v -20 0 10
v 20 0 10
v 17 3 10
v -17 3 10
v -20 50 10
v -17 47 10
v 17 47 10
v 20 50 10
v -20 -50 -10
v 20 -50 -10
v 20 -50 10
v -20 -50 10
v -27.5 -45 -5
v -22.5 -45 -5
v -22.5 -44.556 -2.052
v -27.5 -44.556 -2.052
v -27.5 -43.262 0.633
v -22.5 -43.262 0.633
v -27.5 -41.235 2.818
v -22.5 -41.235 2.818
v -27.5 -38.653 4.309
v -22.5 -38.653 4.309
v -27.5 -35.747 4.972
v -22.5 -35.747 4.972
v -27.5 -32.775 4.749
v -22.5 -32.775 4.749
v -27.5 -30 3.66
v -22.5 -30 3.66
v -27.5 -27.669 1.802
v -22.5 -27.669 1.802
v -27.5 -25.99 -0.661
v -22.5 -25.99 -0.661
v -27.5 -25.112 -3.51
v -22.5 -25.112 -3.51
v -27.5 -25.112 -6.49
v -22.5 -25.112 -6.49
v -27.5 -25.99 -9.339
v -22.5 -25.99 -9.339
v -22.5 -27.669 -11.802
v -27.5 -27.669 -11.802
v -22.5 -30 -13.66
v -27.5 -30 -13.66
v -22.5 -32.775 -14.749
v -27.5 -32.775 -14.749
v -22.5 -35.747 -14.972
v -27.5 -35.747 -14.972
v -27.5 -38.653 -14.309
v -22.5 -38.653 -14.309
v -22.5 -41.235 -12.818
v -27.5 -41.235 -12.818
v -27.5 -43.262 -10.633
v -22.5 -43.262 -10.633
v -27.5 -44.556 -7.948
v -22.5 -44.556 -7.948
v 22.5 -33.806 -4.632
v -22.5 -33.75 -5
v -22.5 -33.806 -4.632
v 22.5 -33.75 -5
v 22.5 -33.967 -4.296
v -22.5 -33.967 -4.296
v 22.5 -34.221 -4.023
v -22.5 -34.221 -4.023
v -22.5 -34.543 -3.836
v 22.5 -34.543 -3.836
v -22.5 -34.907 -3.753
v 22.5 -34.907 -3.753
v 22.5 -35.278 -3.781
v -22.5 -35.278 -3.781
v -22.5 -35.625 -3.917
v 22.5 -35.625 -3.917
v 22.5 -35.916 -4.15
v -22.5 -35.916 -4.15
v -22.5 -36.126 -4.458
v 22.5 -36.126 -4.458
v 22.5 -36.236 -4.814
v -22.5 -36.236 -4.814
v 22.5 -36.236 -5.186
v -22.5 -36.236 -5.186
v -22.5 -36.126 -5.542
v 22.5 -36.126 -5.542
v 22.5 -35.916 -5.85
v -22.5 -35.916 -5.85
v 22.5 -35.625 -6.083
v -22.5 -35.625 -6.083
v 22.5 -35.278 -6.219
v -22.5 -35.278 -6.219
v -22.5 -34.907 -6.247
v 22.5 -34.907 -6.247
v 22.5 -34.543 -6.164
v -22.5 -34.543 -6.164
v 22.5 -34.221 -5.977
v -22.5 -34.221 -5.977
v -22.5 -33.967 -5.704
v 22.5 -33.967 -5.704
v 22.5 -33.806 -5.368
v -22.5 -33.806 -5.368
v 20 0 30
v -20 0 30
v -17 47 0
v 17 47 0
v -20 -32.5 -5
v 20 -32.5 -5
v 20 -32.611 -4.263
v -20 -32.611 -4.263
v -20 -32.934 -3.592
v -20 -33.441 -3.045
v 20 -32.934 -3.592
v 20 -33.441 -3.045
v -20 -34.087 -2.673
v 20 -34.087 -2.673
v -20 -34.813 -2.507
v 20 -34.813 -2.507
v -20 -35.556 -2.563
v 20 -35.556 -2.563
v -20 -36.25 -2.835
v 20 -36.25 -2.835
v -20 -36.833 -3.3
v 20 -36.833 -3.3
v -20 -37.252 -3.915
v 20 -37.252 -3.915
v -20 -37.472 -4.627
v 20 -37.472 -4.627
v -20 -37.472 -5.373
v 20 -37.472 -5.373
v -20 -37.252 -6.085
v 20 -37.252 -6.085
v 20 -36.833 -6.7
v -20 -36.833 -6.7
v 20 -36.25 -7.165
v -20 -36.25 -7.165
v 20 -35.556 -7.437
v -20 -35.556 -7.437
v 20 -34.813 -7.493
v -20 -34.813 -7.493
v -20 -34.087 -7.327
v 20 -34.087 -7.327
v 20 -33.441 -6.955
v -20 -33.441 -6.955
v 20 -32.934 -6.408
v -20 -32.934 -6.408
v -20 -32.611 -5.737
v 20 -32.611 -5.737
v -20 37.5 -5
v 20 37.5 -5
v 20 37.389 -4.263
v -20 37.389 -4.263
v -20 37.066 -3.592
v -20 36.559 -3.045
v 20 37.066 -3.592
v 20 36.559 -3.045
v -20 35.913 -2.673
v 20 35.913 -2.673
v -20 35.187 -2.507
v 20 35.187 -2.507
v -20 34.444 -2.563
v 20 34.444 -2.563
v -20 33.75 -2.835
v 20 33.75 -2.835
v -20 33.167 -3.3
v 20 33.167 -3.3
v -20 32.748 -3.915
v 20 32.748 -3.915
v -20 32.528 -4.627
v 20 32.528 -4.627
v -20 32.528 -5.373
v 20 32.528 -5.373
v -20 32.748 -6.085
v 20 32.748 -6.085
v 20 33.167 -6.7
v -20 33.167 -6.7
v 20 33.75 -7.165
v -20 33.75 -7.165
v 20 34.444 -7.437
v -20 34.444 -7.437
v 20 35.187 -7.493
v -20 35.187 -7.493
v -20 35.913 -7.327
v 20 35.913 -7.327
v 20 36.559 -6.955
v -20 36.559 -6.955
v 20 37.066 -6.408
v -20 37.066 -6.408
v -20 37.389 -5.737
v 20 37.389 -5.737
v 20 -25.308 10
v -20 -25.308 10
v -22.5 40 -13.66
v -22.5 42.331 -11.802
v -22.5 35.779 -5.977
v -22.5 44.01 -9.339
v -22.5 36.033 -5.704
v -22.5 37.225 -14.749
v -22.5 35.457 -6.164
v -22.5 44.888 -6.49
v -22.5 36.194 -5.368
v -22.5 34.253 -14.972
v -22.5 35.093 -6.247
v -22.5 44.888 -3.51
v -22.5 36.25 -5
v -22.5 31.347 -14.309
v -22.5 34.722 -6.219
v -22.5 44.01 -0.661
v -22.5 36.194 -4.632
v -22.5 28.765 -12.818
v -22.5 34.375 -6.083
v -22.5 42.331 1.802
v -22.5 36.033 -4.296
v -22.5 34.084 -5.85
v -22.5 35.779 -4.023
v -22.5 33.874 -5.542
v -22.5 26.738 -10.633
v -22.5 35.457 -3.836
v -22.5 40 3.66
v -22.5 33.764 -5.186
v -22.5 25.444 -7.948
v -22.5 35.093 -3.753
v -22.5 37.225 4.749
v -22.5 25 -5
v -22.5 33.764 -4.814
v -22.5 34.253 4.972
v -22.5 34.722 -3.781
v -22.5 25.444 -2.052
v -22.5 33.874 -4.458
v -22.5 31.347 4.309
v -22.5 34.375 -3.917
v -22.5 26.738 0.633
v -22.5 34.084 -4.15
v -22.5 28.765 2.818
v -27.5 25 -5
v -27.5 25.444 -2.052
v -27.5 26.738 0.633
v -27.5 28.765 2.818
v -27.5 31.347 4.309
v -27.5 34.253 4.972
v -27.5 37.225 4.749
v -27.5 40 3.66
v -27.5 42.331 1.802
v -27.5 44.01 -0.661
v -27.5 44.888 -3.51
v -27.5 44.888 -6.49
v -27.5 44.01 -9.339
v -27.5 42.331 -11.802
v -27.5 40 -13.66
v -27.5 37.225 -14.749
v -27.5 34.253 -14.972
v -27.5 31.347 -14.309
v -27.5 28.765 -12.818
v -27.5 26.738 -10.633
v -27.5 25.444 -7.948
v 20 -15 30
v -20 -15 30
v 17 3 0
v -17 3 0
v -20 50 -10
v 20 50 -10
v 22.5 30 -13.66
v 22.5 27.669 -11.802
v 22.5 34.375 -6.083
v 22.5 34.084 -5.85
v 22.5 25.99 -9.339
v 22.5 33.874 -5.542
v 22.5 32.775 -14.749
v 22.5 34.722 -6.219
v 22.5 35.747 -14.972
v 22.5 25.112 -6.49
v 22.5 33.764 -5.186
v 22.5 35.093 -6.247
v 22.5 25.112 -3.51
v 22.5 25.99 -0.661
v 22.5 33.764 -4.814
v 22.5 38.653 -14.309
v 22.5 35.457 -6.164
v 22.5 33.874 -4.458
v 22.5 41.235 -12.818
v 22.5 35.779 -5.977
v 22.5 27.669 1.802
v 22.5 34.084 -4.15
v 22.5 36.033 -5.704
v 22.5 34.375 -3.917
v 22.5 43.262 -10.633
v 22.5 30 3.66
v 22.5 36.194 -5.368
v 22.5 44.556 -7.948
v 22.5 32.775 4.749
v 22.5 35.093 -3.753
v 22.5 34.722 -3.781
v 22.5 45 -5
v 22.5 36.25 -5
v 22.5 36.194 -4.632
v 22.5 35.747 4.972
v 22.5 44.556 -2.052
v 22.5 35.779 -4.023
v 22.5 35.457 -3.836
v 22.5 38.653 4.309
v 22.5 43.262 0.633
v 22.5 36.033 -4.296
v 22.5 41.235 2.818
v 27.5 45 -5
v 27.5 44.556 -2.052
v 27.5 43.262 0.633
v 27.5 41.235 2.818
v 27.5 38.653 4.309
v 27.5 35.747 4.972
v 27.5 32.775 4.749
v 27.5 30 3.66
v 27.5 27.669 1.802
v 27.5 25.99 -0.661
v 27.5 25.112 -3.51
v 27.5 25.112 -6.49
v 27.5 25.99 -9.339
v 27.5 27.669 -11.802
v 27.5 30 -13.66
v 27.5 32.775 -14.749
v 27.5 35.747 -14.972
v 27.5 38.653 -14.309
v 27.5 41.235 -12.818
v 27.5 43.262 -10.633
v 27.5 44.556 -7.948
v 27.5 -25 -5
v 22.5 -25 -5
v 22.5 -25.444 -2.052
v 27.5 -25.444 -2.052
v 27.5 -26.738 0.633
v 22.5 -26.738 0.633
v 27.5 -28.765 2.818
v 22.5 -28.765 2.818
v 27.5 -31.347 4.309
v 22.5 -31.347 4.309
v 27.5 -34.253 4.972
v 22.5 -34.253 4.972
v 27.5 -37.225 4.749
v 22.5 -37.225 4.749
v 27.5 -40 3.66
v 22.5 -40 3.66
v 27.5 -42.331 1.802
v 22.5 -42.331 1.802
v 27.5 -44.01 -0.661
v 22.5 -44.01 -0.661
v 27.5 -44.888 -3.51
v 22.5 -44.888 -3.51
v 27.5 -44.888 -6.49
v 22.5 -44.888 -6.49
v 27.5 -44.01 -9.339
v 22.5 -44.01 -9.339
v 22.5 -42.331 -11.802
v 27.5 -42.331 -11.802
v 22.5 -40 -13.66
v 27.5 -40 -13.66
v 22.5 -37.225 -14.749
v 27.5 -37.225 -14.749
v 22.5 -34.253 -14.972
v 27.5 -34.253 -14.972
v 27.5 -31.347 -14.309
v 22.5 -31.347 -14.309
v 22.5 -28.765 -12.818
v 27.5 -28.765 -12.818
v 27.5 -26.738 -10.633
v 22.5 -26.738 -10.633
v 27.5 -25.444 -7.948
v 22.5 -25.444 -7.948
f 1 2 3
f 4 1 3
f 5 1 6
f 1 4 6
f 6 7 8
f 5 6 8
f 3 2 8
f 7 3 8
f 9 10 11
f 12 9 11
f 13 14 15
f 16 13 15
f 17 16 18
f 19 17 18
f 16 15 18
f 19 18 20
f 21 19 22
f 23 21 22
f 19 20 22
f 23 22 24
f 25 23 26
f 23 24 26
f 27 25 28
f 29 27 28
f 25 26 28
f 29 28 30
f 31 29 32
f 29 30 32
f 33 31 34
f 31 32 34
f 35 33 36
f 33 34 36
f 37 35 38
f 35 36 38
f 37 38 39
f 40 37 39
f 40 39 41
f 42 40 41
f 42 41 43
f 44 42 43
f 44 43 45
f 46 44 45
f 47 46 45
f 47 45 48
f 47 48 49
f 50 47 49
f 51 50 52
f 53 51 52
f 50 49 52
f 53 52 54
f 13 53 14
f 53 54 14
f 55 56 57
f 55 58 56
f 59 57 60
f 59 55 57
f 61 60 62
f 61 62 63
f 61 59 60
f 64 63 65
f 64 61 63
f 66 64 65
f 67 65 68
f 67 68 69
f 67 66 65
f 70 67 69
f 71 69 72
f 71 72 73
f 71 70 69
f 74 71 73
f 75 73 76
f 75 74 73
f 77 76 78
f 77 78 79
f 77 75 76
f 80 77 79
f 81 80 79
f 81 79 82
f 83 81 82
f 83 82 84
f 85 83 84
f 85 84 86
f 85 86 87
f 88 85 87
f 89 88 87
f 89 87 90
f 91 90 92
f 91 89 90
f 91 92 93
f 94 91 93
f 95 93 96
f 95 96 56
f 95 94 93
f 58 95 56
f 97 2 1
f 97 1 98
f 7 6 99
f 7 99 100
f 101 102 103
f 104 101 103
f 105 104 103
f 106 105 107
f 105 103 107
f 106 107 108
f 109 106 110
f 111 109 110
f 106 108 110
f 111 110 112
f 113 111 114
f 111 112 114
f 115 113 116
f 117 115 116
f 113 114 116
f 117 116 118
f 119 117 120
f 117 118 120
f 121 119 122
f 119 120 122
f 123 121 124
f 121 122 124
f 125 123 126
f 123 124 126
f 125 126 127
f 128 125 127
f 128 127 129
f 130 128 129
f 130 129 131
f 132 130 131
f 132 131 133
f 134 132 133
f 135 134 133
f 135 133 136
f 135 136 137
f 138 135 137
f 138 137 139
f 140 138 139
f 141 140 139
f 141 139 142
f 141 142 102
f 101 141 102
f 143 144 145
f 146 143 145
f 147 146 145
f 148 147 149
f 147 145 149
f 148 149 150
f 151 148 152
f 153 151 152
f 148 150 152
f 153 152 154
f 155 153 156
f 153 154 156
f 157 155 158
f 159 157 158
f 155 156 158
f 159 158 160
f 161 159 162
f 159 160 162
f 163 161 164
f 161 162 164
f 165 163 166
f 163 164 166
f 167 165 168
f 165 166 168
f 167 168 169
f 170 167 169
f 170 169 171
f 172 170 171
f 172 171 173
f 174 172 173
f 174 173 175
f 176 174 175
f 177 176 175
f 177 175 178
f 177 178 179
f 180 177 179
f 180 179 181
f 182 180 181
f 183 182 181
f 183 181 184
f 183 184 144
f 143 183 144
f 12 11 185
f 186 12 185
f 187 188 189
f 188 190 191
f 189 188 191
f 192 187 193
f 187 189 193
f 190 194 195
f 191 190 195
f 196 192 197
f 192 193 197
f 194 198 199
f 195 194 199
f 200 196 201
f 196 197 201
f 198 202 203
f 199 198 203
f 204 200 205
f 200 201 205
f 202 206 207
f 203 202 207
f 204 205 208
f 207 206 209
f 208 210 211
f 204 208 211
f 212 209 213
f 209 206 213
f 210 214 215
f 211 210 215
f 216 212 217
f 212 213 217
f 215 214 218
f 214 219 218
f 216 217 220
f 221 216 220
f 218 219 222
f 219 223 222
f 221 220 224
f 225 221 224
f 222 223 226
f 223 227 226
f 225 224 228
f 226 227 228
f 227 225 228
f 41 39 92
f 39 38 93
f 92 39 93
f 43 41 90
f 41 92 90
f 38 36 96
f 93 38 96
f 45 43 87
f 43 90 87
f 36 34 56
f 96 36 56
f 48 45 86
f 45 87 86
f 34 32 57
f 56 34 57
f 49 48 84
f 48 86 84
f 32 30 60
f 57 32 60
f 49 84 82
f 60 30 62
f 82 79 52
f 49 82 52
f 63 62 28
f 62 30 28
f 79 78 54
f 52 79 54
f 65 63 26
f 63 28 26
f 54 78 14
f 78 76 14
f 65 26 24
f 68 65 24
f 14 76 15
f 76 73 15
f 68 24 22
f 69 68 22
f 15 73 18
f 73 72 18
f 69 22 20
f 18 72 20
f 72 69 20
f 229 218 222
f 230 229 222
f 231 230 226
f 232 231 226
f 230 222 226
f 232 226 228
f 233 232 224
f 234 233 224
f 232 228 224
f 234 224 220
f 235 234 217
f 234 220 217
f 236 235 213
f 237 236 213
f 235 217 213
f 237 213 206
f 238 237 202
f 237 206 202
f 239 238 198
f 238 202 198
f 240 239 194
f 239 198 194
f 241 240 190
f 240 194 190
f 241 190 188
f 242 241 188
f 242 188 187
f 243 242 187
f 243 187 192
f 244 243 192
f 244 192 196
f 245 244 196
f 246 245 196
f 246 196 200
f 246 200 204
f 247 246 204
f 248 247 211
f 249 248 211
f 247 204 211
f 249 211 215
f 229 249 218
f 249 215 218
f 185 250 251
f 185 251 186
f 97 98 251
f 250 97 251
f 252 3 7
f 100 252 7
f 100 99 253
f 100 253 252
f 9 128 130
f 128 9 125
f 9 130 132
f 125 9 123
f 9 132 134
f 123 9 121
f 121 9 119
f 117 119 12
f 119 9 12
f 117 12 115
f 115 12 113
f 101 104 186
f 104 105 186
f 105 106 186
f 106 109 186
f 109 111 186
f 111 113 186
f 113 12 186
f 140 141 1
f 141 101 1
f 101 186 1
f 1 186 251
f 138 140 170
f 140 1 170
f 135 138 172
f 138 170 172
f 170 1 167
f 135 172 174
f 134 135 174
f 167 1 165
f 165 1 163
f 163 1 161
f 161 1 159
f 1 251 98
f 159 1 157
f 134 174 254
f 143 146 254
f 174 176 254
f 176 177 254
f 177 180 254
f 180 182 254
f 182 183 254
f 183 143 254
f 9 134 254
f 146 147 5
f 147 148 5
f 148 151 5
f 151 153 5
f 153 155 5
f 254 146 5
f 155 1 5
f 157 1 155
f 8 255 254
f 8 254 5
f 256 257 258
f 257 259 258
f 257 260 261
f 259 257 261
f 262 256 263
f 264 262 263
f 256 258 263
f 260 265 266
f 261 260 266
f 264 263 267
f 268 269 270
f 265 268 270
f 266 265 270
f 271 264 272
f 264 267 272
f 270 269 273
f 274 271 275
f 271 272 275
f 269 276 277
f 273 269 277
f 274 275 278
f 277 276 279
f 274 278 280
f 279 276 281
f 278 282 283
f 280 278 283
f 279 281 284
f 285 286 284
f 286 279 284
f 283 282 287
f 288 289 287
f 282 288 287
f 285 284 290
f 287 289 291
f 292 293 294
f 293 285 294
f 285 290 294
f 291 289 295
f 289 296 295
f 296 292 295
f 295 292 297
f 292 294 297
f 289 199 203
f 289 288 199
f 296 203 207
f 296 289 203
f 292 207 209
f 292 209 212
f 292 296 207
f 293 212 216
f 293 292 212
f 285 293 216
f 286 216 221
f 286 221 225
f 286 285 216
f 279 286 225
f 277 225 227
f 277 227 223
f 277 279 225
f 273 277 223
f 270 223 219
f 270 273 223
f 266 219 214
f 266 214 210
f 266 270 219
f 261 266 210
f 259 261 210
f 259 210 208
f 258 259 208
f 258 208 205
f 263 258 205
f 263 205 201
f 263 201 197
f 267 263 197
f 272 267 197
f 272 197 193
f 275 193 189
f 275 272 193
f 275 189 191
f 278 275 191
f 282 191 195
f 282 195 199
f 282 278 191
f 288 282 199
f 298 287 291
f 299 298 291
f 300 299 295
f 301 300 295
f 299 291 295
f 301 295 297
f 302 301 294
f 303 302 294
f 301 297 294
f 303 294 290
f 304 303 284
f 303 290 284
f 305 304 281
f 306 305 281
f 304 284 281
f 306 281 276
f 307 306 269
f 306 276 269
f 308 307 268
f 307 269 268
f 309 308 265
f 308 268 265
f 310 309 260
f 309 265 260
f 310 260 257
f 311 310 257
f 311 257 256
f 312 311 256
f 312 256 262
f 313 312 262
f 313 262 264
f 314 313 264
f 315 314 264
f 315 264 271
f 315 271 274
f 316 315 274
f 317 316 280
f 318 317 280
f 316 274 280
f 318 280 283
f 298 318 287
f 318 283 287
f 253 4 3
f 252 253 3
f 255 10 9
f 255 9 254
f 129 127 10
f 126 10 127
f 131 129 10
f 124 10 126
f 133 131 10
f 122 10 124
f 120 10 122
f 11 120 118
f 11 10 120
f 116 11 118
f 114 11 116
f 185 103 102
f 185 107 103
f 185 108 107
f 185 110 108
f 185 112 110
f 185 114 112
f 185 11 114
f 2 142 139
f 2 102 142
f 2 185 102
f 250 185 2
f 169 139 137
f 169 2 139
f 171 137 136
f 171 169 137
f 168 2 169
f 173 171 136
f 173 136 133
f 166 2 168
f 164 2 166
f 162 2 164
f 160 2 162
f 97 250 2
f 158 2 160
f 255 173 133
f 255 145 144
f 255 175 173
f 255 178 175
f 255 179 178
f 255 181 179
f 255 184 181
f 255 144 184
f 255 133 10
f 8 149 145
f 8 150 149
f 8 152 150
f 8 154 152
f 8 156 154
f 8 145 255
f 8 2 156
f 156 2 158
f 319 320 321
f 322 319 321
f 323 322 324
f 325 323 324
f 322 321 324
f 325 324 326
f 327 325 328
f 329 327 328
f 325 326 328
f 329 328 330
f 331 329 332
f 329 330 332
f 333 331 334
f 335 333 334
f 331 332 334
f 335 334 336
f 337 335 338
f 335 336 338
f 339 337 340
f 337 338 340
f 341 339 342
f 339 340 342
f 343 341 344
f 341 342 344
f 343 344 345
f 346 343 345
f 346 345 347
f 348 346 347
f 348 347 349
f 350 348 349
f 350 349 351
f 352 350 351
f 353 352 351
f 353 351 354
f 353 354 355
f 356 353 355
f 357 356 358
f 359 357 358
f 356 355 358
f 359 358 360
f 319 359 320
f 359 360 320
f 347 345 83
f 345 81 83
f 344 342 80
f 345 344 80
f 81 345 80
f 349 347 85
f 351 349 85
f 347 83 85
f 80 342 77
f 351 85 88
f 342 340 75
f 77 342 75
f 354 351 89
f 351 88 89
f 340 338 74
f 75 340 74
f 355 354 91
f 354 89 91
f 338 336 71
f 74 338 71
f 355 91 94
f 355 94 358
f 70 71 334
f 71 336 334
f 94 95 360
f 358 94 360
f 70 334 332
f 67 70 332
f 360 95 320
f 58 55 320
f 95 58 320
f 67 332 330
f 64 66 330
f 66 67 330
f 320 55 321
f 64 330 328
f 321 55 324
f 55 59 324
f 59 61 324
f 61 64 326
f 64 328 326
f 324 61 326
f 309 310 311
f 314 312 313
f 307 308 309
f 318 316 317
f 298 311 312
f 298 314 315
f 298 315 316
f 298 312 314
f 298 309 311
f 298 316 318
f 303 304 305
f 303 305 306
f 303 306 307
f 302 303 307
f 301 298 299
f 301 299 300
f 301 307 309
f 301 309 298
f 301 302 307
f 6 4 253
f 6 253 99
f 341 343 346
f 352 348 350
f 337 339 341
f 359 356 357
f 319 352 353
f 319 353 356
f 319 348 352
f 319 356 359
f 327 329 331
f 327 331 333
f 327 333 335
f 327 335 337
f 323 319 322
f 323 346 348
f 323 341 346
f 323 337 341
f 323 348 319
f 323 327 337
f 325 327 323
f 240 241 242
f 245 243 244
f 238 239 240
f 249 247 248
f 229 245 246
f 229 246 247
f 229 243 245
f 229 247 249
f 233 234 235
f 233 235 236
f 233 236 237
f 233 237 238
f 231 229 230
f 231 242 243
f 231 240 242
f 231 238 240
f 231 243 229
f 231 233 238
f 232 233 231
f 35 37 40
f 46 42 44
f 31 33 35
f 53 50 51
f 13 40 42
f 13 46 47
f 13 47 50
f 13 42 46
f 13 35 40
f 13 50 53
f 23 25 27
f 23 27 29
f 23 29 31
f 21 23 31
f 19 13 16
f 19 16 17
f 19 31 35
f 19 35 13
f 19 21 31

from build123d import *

# Parameters (mm, degrees)
F0_W           = 100
F0_H           = 20
F1_DEPTH       = 20
F3_DEPTH       = 40
F4_R           = 2.5
F5_DEPTH       = 40.001
F6_R           = 2.5
F7_DEPTH       = 40.001
F8_W           = 34
F8_H           = 44
F9_DEPTH       = 10
F10_R          = 1.25
F11_DEPTH      = 2.5
F11_DEPTH_BACK = 42.5
F12_R          = 1.25
F13_DEPTH      = 2.5
F13_DEPTH_BACK = 42.5
F14_R          = 10
F15_DEPTH      = 5
F16_R          = 10
F17_DEPTH      = 5
F18_R          = 10
F19_DEPTH      = 5
F20_R          = 10
F21_DEPTH      = 5


with BuildPart() as f1:
    # F0 (on Right) → F1 (new body, symmetric)
    with BuildSketch(Plane.YZ):
        Rectangle(F0_W, F0_H)
    extrude(amount=F1_DEPTH, both=True)

    # F2 (on face) → F3 (join)
    with BuildSketch(Plane.YZ.offset(20)):
        Polygon((-25.30775, 10), (0, 10), (0, 30), (-15, 30), align=None)
    extrude(amount=-F3_DEPTH)

    # F4 (on face) → F5 (cut, through all)
    with BuildSketch(Plane.YZ.offset(20)):
        with Locations((-35, -5)):
            Circle(F4_R)
    extrude(amount=-F5_DEPTH, mode=Mode.SUBTRACT)

    # F6 (on face) → F7 (cut, through all)
    with BuildSketch(Plane.YZ.offset(20)):
        with Locations((35, -5)):
            Circle(F6_R)
    extrude(amount=-F7_DEPTH, mode=Mode.SUBTRACT)

    # F8 (on face) → F9 (cut)
    with BuildSketch(Plane.XY.offset(10)):
        with Locations((0, 25)):
            Rectangle(F8_W, F8_H)
    extrude(amount=-F9_DEPTH, mode=Mode.SUBTRACT)


with BuildPart() as f11:
    # F10 (on face) → F11 (new body, two sides)
    with BuildSketch(Plane.YZ.offset(20)) as f11_sk:
        with Locations((-35, -5)):
            Circle(F10_R)
    extrude(amount=F11_DEPTH)
    extrude(f11_sk.sketch, amount=-F11_DEPTH_BACK)

    # F14 (on face) → F15 (join)
    with BuildSketch(Plane.YZ.offset(22.5)):
        with Locations((-35, -5)):
            Circle(F14_R)
    extrude(amount=F15_DEPTH)

    # F16 (on face) → F17 (join)
    with BuildSketch(Plane(origin=(-22.5, 0, 0), x_dir=(0, -1, 0), z_dir=(-1, 0, 0))):
        with Locations((35, -5)):
            Circle(F16_R)
    extrude(amount=F17_DEPTH)


with BuildPart() as f13:
    # F12 (on face) → F13 (new body, two sides)
    with BuildSketch(Plane.YZ.offset(20)) as f13_sk:
        with Locations((35, -5)):
            Circle(F12_R)
    extrude(amount=F13_DEPTH)
    extrude(f13_sk.sketch, amount=-F13_DEPTH_BACK)

    # F18 (on face) → F19 (join)
    with BuildSketch(Plane(origin=(-22.5, 0, 0), x_dir=(0, -1, 0), z_dir=(-1, 0, 0))):
        with Locations((-35, -5)):
            Circle(F18_R)
    extrude(amount=F19_DEPTH)

    # F20 (on face) → F21 (join)
    with BuildSketch(Plane.YZ.offset(22.5)):
        with Locations((35, -5)):
            Circle(F20_R)
    extrude(amount=F21_DEPTH)


solid = Compound([f1.part, f11.part, f13.part])
